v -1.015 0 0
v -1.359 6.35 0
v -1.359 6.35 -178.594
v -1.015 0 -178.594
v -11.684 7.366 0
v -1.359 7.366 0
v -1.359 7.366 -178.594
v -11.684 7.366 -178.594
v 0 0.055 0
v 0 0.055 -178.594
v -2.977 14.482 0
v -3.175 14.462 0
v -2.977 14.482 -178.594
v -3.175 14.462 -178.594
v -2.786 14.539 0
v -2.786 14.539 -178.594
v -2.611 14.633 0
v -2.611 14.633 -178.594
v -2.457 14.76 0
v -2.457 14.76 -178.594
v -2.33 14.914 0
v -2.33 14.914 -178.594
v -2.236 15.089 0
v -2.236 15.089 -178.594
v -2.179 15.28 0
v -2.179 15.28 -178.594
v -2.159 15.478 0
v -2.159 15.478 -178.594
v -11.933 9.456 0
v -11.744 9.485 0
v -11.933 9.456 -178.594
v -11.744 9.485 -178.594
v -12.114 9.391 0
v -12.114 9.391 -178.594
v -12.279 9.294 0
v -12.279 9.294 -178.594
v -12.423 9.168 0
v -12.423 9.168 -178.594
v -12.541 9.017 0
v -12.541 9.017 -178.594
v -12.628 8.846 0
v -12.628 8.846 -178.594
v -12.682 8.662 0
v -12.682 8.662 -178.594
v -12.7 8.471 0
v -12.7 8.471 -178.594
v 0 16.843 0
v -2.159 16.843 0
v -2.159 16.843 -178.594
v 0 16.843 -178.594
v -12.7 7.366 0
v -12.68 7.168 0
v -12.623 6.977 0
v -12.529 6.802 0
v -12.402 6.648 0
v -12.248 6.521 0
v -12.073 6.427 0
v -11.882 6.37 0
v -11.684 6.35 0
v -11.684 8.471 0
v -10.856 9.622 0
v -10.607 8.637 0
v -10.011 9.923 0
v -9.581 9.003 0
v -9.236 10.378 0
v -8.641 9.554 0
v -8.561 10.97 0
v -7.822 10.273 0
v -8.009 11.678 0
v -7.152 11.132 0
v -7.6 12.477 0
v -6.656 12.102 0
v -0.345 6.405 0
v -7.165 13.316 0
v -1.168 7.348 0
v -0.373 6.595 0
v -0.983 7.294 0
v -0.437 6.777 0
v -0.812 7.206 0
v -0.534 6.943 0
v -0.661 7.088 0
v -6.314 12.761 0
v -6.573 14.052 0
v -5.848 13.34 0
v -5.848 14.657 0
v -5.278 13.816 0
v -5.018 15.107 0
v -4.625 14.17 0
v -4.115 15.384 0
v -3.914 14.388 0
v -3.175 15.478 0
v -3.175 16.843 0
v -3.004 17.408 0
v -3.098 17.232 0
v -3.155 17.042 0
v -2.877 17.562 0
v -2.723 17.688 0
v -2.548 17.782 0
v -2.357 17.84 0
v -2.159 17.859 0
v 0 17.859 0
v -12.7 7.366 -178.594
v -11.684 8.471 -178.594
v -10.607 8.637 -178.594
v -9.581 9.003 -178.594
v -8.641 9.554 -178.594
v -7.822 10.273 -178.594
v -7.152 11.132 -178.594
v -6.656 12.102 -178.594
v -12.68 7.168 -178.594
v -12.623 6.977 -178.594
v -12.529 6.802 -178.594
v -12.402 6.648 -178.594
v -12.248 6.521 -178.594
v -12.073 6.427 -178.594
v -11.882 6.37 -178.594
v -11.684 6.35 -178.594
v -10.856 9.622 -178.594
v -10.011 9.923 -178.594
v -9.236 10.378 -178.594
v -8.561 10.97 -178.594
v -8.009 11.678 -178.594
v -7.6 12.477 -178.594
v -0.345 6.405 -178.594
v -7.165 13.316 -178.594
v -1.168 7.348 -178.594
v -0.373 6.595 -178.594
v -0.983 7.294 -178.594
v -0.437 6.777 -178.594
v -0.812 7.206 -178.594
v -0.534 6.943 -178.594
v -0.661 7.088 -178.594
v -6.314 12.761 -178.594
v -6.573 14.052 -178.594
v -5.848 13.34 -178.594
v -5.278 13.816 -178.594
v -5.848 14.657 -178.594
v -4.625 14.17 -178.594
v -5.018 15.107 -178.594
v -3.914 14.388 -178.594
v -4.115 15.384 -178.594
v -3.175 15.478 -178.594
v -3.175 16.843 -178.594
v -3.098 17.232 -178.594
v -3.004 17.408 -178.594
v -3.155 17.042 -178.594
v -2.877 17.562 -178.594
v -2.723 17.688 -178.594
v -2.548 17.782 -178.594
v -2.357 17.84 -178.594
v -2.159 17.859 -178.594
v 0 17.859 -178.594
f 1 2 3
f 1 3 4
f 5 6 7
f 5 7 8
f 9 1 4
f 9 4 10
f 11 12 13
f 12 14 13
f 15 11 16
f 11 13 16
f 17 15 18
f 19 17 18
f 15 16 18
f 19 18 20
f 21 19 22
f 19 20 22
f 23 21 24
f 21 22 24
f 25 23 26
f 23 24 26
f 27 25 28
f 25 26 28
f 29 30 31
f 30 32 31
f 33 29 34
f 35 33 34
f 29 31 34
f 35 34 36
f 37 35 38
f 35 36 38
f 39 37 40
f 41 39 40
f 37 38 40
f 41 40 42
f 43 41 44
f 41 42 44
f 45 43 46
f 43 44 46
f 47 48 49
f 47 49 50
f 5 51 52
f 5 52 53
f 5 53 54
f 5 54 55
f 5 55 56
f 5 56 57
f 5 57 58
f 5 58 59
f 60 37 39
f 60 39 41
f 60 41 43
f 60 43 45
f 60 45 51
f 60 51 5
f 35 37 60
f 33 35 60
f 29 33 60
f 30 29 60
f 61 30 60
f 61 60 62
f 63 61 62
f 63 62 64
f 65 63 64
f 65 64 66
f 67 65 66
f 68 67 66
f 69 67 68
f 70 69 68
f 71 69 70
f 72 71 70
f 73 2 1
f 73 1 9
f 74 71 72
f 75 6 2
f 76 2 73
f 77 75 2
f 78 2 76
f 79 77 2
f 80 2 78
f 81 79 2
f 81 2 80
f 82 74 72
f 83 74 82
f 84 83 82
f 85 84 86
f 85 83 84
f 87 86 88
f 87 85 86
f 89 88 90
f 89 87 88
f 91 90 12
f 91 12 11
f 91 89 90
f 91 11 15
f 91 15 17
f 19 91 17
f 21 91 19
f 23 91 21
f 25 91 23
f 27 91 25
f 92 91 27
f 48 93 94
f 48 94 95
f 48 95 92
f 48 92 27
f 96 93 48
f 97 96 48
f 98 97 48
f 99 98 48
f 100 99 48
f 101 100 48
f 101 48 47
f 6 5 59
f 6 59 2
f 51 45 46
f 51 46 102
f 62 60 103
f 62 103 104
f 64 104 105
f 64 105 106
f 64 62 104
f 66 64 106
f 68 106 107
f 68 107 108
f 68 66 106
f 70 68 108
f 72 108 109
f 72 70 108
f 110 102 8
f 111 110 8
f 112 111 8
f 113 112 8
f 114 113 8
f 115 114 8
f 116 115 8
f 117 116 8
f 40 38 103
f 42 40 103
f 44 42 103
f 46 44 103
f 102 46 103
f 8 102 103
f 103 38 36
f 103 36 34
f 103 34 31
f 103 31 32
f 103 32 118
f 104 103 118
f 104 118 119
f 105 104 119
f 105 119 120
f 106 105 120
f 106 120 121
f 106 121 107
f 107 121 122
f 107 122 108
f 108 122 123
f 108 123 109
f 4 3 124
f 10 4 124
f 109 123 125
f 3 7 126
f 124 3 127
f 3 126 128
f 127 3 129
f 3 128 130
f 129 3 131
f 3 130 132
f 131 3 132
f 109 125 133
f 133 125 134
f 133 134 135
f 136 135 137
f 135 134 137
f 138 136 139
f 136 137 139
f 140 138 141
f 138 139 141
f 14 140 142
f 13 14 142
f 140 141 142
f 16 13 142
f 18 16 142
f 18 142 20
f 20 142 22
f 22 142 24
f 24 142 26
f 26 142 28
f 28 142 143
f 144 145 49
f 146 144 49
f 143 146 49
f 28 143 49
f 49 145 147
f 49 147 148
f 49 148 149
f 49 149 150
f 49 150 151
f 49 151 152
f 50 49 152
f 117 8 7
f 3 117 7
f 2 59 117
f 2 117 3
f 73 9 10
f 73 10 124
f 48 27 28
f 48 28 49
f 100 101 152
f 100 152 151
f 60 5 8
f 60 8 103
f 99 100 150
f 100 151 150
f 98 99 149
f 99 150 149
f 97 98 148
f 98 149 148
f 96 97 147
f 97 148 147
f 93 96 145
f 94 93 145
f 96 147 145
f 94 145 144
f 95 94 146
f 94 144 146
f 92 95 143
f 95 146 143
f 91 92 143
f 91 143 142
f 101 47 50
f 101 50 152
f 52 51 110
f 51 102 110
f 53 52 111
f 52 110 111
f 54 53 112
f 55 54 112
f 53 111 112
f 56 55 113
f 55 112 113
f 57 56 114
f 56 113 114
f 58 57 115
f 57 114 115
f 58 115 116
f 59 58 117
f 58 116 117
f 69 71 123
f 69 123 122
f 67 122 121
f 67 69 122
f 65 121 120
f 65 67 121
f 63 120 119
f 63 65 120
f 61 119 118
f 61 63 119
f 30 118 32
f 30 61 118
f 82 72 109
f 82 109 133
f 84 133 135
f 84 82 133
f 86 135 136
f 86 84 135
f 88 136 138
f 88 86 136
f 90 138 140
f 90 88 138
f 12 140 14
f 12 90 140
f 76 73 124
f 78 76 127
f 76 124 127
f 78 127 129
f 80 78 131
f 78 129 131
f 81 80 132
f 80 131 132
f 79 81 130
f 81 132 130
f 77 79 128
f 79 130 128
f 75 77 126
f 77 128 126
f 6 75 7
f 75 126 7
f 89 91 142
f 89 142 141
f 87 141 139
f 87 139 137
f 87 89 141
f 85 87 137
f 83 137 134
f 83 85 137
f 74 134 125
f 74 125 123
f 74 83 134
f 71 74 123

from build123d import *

# Parameters (mm, degrees)
EXTRUDE_THIN1_DEPTH = 178.59375
FILLET1_R           = 1.016


with BuildPart() as part:
    # Sketch1 → Extrude-Thin1 (new body)
    with BuildSketch(Plane.XY):
        with BuildLine():
            Line((0, 17.859375), (-3.175, 17.859375))
            Line((-3.175, 17.859375), (-3.175, 15.478125))
            ThreePointArc((-3.175, 15.478125), (-5.84807115, 14.657210579), (-7.599625174, 12.477470145))
            ThreePointArc((-7.599625174, 12.477470145), (-9.638294165, 10.117590004), (-12.7, 9.525))
            Line((-12.7, 9.525), (-12.7, 6.35))
            Line((-12.7, 6.35), (-1.359217172, 6.35))
            Line((-1.359217172, 6.35), (-1.014506285, 0))
            Line((-1.014506285, 0), (0, 0.055072655))
            Line((0, 0.055072655), (-0.396875, 7.366))
            Line((-0.396875, 7.366), (-11.684, 7.366))
            Line((-11.684, 7.366), (-11.684, 8.47084132))
            ThreePointArc((-11.684, 8.47084132), (-8.641469435, 9.554461447), (-6.655705137, 12.101609848))
            ThreePointArc((-6.655705137, 12.101609848), (-4.833592242, 14.074990123), (-2.159, 14.3217318))
            Line((-2.159, 14.3217318), (-2.159, 16.843375))
            Line((-2.159, 16.843375), (0, 16.843375))
            Line((0, 16.843375), (0, 17.859375))
        make_face()
    extrude(amount=-EXTRUDE_THIN1_DEPTH)

    # Fillet1
    fillet1_edges = [part.edges().sort_by_distance(p)[0] for p in [
        (-12.7, 6.35, -89.296875),
        (-12.7, 9.525, -89.296875),
        (-3.175, 17.859375, -89.296875),
        (-2.159, 14.3217318, -89.296875),
        (-0.396875, 7.366, -89.296875),
    ]]
    fillet(fillet1_edges, radius=FILLET1_R)


solid = part.part
